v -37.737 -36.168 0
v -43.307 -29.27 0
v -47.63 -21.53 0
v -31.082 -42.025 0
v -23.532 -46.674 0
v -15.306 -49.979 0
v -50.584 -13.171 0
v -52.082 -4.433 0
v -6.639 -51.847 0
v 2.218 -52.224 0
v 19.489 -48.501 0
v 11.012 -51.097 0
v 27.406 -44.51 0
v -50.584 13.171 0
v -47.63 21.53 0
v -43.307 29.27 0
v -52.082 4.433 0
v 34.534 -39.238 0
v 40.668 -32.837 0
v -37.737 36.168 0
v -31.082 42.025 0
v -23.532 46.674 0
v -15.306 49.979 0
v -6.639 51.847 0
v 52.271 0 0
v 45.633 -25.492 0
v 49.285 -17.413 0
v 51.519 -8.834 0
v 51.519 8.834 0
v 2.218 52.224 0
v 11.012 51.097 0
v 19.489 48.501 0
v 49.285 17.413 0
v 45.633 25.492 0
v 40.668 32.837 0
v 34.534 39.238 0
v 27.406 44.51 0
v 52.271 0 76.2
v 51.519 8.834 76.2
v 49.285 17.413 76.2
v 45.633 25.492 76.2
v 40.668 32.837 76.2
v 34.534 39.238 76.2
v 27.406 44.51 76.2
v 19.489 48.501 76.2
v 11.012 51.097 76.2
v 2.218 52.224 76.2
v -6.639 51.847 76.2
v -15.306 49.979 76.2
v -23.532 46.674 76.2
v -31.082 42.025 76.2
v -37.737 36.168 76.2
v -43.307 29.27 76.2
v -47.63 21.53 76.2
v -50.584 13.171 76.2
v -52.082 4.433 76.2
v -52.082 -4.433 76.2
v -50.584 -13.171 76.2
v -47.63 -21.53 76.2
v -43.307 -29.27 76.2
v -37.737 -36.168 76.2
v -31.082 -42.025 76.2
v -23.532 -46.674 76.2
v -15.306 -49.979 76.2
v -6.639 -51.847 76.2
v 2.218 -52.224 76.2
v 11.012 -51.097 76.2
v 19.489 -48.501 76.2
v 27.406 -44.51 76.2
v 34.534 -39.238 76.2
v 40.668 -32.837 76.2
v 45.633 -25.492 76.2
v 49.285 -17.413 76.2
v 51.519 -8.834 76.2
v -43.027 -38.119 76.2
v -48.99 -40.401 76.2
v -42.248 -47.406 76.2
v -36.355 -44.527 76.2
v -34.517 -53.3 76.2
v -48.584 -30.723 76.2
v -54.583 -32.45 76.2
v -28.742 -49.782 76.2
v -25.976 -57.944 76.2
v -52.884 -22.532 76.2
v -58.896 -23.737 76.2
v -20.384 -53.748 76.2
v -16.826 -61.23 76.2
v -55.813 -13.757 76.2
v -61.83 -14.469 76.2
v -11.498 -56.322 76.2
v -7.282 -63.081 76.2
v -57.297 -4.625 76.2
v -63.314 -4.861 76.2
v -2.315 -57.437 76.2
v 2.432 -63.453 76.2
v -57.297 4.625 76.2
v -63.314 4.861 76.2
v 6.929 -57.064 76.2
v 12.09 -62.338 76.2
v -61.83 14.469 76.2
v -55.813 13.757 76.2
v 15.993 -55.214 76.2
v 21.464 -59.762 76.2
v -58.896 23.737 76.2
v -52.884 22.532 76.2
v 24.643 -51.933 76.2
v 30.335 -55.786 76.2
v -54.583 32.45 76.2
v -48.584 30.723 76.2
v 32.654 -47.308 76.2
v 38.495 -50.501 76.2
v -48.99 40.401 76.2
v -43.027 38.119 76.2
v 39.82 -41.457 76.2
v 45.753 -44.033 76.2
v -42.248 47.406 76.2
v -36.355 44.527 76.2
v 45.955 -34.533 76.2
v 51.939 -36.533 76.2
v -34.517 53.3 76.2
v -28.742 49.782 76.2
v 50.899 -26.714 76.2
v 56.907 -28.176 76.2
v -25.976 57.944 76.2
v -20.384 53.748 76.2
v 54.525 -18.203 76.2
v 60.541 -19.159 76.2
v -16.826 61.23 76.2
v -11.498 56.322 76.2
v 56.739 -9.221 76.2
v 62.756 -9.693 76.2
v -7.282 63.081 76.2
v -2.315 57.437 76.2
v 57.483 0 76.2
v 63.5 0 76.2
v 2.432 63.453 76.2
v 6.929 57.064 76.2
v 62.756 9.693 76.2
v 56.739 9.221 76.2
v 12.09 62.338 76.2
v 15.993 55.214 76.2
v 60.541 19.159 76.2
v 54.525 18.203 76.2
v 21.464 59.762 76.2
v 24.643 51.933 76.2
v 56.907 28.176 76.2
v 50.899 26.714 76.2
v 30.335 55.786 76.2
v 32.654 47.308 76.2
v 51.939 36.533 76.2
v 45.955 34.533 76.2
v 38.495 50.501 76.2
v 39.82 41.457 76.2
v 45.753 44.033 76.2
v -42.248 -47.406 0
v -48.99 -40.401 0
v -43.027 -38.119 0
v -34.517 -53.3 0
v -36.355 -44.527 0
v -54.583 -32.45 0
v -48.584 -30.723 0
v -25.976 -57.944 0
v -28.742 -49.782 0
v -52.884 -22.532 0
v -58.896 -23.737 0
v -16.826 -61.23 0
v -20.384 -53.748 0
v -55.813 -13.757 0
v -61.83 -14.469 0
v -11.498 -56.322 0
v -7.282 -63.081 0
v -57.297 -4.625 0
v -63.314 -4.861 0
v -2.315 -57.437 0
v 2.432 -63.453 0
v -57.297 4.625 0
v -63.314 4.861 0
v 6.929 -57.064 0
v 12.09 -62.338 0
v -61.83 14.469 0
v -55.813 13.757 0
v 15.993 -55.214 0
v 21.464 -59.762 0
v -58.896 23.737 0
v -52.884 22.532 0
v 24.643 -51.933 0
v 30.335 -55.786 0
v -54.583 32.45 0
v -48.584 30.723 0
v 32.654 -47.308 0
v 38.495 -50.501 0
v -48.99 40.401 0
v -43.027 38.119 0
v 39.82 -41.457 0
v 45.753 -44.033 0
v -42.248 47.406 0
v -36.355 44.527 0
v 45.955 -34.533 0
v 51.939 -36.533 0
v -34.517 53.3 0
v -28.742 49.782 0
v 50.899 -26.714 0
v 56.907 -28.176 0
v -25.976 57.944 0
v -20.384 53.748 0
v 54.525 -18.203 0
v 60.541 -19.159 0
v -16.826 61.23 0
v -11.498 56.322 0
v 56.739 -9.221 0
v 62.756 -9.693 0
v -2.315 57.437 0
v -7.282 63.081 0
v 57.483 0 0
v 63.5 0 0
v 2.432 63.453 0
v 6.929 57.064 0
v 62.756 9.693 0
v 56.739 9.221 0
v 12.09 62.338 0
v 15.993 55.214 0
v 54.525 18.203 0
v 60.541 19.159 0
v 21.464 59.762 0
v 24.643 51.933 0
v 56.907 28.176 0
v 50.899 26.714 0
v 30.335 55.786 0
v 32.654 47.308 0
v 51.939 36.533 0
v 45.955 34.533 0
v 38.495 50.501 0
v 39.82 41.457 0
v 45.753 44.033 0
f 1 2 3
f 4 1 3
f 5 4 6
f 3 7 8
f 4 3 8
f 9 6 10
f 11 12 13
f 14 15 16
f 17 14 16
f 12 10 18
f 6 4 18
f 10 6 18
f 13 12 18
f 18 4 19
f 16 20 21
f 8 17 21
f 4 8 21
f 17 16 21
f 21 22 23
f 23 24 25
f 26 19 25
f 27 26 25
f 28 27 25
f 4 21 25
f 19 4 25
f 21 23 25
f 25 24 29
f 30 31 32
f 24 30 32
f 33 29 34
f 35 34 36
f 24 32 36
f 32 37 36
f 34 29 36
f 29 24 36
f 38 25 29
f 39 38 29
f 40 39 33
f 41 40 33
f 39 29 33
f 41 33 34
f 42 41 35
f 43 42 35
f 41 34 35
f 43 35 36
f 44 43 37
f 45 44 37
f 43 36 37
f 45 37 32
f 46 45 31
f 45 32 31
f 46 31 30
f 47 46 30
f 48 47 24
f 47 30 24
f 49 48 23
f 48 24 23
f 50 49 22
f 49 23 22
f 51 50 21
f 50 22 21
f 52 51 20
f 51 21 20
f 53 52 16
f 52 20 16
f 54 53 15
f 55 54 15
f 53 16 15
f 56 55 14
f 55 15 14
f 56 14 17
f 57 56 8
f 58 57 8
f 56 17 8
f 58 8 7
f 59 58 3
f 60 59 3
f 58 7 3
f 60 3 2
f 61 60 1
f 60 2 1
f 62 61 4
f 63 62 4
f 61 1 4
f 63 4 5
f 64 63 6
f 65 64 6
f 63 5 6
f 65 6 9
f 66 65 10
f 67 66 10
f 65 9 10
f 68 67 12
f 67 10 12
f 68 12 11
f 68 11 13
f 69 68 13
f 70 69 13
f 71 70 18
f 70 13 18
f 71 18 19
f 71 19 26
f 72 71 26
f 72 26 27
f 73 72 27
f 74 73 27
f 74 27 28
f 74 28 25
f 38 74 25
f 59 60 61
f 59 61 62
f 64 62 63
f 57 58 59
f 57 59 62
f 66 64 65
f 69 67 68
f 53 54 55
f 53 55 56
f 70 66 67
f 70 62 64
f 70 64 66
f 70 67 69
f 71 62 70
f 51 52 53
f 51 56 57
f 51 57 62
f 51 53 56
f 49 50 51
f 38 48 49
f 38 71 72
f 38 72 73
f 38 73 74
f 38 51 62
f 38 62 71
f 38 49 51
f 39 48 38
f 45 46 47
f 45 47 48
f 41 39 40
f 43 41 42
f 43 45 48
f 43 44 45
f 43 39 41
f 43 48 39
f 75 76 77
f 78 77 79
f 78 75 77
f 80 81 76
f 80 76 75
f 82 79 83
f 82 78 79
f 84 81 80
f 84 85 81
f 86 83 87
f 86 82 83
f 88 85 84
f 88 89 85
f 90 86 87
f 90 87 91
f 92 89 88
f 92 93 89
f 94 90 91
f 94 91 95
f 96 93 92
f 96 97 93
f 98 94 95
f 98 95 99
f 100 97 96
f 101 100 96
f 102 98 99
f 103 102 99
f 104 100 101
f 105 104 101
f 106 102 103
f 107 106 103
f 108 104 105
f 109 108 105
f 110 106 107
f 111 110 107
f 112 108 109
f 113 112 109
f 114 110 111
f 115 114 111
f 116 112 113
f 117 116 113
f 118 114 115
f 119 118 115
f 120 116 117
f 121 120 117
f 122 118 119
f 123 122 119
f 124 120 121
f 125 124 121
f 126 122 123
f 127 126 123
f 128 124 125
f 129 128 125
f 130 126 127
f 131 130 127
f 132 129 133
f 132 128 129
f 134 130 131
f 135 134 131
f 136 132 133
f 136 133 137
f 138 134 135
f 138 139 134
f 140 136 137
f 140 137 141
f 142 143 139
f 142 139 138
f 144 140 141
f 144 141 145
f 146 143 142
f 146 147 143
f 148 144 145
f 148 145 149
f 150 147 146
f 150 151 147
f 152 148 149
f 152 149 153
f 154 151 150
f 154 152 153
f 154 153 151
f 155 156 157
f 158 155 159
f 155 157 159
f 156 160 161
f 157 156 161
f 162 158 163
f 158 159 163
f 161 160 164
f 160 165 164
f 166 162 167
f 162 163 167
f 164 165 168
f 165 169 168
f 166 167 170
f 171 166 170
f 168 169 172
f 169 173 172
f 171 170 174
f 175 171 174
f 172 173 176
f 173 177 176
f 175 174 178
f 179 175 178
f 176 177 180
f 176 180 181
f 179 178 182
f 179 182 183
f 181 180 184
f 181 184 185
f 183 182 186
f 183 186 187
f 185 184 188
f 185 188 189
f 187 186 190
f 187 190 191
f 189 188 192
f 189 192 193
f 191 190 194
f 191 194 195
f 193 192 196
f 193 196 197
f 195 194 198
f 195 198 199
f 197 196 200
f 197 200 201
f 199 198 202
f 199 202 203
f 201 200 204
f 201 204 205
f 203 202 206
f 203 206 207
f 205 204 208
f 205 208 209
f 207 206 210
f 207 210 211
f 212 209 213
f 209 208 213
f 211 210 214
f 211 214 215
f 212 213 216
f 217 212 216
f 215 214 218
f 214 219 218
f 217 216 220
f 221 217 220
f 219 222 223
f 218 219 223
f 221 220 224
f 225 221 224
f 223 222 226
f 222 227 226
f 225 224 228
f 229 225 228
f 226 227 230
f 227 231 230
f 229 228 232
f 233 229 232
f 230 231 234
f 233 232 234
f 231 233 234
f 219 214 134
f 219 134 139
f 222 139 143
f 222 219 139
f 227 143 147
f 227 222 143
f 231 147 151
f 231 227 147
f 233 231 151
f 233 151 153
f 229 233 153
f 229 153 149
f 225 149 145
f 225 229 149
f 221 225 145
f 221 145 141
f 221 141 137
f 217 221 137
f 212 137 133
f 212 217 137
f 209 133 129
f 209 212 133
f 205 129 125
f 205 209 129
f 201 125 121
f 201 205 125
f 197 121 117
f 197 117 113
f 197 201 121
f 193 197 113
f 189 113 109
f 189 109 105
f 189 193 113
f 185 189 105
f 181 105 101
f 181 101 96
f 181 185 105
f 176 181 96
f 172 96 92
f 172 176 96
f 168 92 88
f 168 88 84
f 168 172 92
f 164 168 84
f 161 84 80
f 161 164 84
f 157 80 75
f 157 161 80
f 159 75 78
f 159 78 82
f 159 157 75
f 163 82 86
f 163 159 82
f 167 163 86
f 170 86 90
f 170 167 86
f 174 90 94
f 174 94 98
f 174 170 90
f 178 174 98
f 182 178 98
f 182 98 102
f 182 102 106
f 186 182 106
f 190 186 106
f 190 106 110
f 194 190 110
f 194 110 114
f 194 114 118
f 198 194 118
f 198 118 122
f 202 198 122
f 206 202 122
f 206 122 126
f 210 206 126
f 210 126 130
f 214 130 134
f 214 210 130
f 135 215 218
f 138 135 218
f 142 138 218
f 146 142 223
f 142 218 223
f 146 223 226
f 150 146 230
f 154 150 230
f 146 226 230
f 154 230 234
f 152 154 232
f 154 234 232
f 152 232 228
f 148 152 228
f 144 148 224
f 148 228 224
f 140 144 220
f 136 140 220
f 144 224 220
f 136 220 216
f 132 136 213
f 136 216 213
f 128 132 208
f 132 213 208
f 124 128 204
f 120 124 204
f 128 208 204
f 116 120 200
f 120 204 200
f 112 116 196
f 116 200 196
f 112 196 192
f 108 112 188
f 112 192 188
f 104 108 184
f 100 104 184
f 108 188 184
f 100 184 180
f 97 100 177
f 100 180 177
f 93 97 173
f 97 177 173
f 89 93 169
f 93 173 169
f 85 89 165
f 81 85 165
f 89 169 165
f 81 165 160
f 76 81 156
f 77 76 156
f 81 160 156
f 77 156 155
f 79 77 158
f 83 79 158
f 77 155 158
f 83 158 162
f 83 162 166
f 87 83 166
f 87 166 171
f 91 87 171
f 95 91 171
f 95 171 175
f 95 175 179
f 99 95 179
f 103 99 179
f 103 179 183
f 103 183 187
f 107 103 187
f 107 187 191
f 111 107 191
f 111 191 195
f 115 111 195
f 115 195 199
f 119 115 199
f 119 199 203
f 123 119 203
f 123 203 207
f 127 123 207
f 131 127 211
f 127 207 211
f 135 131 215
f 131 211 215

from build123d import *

# Parameters (mm, degrees)
F0_R     = 63.5
F1_DEPTH = 76.2
F2_R     = 57.483391
F2_R_2   = 52.270628
F3_DEPTH = 76.2


with BuildPart() as f1:
    # F0 (on Top) → F1 (new body)
    with BuildSketch(Plane.XY):
        Circle(F0_R)
    extrude(amount=F1_DEPTH)

    # F2 (on Top) → F3 (cut)
    with BuildSketch(Plane.XY):
        Circle(F2_R)
        Circle(F2_R_2, mode=Mode.SUBTRACT)
    extrude(amount=F3_DEPTH, mode=Mode.SUBTRACT)


solid = f1.part
